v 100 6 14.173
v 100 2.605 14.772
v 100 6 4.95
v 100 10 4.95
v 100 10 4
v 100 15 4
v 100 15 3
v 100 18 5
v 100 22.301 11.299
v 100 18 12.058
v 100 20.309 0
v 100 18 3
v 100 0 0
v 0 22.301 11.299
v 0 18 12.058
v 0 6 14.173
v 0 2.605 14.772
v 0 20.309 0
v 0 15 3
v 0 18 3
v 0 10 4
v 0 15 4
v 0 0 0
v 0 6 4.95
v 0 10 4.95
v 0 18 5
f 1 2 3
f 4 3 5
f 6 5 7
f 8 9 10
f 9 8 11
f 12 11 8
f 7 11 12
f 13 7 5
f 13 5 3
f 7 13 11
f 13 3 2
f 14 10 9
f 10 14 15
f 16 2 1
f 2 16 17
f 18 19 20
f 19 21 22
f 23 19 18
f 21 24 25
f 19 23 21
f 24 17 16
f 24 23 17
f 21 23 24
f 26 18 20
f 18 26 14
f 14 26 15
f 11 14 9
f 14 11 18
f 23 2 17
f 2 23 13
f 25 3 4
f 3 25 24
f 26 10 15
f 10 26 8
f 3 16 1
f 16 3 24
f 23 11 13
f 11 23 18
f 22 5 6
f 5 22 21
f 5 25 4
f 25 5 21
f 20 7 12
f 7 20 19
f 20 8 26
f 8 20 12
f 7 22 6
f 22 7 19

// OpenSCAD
difference(){
    rotate([-10 ,0,0]){
        difference(){
            cube([100,20,15]){}
            rotate([10,0,0]){
                translate([-2,6,4.95]){
                    cube([302,12,18]){}
                }
            }
            rotate([10,0,0]){
                translate([-2,0,-18]){
                    cube([302,24,18]){}
                }
            }
        }
    }
    // here come the steps
    translate([-1,10,4]){
                cube([302,6 ,1]){}
    }
    translate([-1,15,3]){
                cube([302,3,2]){}
    }
}
